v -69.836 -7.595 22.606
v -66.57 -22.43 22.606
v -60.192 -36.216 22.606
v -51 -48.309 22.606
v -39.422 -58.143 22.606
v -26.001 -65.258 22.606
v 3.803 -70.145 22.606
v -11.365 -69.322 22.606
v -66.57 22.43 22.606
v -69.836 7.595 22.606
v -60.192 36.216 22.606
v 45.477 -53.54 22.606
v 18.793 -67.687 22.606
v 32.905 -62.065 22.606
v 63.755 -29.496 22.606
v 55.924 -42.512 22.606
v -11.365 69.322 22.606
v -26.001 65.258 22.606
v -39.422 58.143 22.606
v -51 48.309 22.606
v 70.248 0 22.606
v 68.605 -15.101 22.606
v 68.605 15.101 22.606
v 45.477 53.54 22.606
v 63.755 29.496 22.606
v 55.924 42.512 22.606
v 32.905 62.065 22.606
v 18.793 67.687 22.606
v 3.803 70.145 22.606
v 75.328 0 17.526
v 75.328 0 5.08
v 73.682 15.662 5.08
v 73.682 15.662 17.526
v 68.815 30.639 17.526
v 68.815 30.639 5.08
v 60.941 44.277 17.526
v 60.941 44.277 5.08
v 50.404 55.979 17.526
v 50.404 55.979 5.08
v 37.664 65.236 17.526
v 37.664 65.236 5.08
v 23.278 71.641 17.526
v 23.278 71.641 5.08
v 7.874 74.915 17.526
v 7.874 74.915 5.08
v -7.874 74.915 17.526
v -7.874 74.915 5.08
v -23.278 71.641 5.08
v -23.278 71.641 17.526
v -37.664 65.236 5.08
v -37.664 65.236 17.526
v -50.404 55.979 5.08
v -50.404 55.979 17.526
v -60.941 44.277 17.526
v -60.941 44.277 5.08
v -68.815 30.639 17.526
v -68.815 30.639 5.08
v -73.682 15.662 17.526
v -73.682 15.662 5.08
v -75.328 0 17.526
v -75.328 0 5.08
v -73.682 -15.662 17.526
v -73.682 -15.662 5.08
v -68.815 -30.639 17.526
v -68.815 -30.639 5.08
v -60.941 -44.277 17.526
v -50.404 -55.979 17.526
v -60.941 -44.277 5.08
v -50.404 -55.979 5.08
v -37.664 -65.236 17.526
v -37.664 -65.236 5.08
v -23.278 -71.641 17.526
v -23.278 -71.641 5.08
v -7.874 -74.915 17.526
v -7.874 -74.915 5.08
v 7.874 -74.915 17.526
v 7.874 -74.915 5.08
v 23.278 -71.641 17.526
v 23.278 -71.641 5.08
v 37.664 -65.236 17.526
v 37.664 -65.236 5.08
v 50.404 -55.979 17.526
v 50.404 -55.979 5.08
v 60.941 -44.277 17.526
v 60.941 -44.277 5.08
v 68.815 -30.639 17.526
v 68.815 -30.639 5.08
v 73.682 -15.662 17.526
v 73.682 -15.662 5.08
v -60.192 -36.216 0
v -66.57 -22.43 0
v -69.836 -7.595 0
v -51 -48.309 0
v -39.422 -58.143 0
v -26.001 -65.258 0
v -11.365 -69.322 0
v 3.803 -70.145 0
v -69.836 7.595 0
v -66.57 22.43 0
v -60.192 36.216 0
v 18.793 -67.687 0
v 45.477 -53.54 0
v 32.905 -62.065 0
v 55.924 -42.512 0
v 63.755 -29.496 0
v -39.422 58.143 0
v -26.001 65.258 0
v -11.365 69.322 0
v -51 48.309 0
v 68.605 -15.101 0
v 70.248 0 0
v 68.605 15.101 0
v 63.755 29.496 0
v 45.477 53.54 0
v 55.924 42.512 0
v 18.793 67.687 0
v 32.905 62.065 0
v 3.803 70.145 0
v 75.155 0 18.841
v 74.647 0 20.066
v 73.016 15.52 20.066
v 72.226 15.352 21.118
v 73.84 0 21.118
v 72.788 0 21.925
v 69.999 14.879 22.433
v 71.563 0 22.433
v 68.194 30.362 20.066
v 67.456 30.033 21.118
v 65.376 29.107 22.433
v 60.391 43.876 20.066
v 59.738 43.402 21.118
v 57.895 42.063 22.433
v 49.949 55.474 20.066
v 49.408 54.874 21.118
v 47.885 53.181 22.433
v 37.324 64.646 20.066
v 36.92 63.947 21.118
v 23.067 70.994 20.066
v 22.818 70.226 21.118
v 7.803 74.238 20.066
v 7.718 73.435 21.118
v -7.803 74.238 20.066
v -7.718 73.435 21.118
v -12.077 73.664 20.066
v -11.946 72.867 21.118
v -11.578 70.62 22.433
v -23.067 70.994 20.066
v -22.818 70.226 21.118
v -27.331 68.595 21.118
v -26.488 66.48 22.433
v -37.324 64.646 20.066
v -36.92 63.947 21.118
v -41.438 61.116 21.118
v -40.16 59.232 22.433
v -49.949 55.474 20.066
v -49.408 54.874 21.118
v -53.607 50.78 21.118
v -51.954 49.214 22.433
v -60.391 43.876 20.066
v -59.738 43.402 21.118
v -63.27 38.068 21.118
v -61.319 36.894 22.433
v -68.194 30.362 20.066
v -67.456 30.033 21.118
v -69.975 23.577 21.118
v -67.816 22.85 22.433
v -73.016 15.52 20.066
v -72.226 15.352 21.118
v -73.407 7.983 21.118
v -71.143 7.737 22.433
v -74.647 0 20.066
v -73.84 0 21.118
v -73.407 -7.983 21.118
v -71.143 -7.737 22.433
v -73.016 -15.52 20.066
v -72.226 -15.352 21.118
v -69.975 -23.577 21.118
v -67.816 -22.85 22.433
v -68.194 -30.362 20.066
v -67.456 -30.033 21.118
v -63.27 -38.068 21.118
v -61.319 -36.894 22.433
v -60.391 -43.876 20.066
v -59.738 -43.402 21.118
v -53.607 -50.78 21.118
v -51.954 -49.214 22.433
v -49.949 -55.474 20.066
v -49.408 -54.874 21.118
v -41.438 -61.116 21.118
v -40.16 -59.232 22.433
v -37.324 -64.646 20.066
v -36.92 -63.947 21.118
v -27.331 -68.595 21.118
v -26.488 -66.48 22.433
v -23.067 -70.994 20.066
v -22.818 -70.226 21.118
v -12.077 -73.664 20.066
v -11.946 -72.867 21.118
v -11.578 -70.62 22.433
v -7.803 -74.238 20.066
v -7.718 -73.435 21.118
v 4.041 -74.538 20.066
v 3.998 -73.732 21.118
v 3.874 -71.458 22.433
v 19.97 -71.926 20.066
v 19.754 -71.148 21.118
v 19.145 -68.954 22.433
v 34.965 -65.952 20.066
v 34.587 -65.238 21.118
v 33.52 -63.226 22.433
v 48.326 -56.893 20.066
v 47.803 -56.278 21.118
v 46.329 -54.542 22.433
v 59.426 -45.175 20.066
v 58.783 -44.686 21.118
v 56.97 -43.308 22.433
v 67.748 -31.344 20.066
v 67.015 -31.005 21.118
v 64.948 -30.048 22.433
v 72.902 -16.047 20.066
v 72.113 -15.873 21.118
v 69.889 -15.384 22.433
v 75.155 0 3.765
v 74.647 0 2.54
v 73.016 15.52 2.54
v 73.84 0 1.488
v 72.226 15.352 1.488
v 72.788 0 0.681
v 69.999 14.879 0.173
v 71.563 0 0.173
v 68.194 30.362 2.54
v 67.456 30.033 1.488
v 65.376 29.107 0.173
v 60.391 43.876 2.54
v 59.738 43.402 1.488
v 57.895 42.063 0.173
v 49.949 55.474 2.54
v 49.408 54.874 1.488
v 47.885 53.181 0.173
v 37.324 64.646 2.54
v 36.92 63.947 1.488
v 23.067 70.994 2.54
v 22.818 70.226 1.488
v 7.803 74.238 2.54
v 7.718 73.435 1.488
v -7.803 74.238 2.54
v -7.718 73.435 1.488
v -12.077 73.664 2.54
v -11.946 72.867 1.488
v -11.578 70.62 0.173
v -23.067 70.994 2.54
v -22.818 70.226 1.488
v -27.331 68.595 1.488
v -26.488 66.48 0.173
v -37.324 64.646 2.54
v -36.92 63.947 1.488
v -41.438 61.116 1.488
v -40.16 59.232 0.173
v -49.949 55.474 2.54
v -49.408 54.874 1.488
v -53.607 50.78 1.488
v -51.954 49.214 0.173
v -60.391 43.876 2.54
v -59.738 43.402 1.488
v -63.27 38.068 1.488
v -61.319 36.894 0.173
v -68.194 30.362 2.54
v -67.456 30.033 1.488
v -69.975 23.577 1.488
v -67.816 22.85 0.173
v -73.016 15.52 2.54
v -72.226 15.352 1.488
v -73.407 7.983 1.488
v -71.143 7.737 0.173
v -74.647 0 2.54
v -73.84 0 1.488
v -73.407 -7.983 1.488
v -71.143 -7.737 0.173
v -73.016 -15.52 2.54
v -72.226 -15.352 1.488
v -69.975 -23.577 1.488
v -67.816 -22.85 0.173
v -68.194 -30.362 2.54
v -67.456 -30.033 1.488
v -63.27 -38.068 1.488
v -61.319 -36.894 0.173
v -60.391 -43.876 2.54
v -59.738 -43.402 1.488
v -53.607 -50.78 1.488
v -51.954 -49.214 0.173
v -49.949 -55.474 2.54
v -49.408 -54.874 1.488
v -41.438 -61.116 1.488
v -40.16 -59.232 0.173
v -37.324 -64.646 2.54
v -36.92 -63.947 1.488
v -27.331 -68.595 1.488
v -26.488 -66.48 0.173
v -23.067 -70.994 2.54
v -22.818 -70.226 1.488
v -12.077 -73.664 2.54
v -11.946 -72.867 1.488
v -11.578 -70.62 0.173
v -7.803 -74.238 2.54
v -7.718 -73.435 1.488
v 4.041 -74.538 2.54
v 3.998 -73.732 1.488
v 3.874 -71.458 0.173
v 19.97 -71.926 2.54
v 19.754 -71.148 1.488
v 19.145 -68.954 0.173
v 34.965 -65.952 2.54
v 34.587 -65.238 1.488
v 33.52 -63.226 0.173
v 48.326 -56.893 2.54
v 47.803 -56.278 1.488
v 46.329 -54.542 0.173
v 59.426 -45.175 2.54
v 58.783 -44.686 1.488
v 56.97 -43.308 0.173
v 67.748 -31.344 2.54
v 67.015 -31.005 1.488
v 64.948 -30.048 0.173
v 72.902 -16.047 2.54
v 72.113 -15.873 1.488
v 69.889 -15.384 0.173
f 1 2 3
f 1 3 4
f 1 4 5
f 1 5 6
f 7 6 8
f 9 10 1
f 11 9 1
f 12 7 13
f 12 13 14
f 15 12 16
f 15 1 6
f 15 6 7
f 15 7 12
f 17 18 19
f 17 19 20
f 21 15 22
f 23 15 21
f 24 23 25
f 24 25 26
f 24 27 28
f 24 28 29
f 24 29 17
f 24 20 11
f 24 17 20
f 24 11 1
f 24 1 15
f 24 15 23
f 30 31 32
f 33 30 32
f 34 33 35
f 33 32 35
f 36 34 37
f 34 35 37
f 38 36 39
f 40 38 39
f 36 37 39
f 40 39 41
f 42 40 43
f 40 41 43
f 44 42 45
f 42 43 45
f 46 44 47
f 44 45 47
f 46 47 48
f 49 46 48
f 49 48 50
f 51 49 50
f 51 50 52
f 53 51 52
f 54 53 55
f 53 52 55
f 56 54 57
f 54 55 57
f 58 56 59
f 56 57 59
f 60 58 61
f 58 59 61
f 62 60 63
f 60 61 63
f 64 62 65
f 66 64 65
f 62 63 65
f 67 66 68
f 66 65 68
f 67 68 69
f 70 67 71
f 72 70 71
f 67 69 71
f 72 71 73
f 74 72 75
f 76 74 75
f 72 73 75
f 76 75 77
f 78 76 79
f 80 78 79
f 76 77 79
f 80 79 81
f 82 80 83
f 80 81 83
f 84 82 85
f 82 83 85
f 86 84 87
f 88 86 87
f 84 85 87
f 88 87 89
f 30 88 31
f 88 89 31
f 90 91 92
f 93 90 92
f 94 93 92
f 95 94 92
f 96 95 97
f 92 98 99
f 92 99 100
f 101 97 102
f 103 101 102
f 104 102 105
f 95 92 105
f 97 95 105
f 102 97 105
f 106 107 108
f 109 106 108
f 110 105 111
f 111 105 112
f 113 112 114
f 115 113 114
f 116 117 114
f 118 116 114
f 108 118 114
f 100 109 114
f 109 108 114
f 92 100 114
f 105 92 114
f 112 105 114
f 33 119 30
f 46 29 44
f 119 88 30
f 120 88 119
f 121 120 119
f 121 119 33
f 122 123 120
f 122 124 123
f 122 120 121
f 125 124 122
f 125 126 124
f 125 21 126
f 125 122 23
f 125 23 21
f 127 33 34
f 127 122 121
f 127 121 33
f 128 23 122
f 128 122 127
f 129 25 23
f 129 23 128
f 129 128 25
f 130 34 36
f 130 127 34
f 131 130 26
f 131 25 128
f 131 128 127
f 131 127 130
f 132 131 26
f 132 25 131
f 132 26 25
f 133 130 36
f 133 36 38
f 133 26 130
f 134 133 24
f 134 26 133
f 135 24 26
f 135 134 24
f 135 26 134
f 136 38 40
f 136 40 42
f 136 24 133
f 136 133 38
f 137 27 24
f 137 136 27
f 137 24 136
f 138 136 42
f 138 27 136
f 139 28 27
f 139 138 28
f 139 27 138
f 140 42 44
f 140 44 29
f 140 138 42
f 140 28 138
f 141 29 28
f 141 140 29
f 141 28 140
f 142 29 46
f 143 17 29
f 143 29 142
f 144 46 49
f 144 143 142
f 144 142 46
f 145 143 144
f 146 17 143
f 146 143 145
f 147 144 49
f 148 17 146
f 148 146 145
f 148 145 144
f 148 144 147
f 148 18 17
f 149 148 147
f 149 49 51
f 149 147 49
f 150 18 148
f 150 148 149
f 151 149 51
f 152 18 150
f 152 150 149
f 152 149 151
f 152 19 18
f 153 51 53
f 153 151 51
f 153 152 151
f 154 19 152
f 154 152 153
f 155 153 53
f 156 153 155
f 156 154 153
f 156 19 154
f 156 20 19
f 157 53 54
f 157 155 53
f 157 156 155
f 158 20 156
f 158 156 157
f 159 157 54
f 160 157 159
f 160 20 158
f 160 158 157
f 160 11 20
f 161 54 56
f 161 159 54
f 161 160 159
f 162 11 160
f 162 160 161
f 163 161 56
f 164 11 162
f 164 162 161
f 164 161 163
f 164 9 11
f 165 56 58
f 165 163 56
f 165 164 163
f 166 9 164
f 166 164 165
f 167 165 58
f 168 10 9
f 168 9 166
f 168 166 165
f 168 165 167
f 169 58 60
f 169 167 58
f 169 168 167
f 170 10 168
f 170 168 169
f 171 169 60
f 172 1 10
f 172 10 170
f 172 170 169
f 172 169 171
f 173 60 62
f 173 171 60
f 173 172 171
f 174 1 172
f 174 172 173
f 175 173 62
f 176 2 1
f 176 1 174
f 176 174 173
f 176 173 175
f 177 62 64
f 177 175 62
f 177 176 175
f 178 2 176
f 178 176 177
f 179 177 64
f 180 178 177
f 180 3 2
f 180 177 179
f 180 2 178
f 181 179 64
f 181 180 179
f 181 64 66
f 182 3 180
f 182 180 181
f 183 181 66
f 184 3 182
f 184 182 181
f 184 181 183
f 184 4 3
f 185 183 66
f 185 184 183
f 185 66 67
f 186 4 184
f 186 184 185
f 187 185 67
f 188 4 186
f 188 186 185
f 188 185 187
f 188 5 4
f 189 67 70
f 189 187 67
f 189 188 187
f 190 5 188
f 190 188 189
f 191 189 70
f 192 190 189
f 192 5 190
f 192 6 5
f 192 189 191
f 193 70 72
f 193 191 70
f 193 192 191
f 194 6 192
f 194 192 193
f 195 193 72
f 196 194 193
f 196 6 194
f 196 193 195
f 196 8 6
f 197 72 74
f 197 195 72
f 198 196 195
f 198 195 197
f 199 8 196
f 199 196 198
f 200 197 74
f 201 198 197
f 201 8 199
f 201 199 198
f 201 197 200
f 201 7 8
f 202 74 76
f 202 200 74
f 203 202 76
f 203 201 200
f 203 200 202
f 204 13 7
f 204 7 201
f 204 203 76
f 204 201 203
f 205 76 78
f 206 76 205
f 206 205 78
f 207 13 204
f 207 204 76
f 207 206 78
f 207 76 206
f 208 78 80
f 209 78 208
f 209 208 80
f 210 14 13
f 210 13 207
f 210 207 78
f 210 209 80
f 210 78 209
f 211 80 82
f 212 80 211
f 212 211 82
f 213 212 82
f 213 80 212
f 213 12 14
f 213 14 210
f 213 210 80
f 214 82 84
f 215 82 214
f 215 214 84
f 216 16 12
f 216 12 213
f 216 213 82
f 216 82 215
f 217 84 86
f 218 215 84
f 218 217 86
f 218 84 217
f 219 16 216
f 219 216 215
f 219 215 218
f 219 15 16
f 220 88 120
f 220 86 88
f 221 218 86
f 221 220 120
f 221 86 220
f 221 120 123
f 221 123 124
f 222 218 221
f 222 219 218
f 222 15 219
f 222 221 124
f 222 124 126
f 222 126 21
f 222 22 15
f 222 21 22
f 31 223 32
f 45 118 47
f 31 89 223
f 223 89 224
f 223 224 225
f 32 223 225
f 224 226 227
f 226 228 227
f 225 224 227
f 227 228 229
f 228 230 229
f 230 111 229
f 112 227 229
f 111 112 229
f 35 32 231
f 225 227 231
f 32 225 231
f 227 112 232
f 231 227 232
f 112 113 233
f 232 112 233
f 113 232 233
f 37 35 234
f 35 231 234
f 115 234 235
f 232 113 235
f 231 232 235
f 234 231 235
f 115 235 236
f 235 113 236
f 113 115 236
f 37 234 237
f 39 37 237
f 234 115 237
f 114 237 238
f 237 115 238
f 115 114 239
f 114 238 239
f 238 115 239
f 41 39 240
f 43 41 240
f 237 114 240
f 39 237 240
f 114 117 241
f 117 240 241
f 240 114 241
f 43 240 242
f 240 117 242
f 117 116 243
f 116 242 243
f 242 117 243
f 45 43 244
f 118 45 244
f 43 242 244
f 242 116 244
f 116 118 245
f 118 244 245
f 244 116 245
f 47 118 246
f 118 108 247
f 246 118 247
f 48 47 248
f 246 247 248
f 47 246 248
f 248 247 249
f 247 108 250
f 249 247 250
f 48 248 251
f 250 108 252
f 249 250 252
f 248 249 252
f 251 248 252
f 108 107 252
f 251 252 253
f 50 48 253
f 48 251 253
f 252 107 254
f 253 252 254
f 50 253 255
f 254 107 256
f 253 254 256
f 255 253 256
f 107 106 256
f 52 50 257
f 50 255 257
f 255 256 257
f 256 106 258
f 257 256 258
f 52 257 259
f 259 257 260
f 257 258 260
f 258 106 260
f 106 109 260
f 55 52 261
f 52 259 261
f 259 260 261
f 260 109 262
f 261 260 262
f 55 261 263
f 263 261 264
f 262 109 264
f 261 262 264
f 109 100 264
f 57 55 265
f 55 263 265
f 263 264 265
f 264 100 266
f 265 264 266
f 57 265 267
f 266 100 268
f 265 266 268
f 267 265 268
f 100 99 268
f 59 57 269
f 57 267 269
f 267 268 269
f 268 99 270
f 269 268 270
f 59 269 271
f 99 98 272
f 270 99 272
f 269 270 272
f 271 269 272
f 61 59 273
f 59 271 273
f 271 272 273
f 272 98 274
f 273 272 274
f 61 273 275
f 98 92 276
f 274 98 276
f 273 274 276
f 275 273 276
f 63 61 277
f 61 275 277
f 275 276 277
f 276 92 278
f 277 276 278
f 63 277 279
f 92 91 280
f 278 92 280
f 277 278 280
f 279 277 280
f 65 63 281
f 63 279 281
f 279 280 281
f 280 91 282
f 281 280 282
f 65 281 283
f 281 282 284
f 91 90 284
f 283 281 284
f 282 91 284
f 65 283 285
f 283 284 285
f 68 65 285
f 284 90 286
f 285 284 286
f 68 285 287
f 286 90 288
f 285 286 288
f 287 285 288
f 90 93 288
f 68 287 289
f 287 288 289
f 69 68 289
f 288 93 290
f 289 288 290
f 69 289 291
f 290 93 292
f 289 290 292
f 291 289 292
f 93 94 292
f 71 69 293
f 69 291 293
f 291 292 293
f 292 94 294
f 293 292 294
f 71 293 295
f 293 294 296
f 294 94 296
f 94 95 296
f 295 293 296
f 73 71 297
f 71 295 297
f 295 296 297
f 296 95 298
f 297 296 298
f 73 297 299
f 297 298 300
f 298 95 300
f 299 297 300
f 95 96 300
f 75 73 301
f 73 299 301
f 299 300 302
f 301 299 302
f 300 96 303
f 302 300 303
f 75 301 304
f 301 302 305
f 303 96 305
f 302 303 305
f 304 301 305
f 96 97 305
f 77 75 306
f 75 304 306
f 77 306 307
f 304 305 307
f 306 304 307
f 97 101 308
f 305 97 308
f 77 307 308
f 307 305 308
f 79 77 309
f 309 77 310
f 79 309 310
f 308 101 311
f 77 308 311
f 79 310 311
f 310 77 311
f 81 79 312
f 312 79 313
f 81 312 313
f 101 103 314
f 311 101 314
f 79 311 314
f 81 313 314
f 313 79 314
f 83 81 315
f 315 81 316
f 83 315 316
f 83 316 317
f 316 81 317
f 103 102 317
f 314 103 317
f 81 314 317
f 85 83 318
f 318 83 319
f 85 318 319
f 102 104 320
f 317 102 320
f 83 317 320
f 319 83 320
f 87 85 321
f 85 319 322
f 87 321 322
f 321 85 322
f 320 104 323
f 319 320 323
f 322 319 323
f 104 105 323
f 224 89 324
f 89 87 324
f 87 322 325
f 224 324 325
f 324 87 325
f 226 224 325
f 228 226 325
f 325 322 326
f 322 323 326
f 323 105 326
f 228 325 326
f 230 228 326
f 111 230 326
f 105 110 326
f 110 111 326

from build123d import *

# Parameters (mm, degrees)
F0_R     = 75.3277173883
F1_DEPTH = 22.606
F2_R     = 5.08
F3_R     = 5.08


with BuildPart() as f1:
    # F0 (on Top) → F1 (new body)
    with BuildSketch(Plane.XY):
        Circle(F0_R)
    extrude(amount=F1_DEPTH)

    # F2
    f2_edges = [f1.edges().sort_by_distance(p)[0] for p in [
        (-75.327717, 0, 0),
    ]]
    fillet(f2_edges, radius=F2_R)

    # F3
    f3_edges = [f1.edges().sort_by_distance(p)[0] for p in [
        (75.327717, 0, 13.843),
        (-75.327717, 0, 5.08),
        (-75.327717, 0, 22.606),
    ]]
    fillet(f3_edges, radius=F3_R)


solid = f1.part
